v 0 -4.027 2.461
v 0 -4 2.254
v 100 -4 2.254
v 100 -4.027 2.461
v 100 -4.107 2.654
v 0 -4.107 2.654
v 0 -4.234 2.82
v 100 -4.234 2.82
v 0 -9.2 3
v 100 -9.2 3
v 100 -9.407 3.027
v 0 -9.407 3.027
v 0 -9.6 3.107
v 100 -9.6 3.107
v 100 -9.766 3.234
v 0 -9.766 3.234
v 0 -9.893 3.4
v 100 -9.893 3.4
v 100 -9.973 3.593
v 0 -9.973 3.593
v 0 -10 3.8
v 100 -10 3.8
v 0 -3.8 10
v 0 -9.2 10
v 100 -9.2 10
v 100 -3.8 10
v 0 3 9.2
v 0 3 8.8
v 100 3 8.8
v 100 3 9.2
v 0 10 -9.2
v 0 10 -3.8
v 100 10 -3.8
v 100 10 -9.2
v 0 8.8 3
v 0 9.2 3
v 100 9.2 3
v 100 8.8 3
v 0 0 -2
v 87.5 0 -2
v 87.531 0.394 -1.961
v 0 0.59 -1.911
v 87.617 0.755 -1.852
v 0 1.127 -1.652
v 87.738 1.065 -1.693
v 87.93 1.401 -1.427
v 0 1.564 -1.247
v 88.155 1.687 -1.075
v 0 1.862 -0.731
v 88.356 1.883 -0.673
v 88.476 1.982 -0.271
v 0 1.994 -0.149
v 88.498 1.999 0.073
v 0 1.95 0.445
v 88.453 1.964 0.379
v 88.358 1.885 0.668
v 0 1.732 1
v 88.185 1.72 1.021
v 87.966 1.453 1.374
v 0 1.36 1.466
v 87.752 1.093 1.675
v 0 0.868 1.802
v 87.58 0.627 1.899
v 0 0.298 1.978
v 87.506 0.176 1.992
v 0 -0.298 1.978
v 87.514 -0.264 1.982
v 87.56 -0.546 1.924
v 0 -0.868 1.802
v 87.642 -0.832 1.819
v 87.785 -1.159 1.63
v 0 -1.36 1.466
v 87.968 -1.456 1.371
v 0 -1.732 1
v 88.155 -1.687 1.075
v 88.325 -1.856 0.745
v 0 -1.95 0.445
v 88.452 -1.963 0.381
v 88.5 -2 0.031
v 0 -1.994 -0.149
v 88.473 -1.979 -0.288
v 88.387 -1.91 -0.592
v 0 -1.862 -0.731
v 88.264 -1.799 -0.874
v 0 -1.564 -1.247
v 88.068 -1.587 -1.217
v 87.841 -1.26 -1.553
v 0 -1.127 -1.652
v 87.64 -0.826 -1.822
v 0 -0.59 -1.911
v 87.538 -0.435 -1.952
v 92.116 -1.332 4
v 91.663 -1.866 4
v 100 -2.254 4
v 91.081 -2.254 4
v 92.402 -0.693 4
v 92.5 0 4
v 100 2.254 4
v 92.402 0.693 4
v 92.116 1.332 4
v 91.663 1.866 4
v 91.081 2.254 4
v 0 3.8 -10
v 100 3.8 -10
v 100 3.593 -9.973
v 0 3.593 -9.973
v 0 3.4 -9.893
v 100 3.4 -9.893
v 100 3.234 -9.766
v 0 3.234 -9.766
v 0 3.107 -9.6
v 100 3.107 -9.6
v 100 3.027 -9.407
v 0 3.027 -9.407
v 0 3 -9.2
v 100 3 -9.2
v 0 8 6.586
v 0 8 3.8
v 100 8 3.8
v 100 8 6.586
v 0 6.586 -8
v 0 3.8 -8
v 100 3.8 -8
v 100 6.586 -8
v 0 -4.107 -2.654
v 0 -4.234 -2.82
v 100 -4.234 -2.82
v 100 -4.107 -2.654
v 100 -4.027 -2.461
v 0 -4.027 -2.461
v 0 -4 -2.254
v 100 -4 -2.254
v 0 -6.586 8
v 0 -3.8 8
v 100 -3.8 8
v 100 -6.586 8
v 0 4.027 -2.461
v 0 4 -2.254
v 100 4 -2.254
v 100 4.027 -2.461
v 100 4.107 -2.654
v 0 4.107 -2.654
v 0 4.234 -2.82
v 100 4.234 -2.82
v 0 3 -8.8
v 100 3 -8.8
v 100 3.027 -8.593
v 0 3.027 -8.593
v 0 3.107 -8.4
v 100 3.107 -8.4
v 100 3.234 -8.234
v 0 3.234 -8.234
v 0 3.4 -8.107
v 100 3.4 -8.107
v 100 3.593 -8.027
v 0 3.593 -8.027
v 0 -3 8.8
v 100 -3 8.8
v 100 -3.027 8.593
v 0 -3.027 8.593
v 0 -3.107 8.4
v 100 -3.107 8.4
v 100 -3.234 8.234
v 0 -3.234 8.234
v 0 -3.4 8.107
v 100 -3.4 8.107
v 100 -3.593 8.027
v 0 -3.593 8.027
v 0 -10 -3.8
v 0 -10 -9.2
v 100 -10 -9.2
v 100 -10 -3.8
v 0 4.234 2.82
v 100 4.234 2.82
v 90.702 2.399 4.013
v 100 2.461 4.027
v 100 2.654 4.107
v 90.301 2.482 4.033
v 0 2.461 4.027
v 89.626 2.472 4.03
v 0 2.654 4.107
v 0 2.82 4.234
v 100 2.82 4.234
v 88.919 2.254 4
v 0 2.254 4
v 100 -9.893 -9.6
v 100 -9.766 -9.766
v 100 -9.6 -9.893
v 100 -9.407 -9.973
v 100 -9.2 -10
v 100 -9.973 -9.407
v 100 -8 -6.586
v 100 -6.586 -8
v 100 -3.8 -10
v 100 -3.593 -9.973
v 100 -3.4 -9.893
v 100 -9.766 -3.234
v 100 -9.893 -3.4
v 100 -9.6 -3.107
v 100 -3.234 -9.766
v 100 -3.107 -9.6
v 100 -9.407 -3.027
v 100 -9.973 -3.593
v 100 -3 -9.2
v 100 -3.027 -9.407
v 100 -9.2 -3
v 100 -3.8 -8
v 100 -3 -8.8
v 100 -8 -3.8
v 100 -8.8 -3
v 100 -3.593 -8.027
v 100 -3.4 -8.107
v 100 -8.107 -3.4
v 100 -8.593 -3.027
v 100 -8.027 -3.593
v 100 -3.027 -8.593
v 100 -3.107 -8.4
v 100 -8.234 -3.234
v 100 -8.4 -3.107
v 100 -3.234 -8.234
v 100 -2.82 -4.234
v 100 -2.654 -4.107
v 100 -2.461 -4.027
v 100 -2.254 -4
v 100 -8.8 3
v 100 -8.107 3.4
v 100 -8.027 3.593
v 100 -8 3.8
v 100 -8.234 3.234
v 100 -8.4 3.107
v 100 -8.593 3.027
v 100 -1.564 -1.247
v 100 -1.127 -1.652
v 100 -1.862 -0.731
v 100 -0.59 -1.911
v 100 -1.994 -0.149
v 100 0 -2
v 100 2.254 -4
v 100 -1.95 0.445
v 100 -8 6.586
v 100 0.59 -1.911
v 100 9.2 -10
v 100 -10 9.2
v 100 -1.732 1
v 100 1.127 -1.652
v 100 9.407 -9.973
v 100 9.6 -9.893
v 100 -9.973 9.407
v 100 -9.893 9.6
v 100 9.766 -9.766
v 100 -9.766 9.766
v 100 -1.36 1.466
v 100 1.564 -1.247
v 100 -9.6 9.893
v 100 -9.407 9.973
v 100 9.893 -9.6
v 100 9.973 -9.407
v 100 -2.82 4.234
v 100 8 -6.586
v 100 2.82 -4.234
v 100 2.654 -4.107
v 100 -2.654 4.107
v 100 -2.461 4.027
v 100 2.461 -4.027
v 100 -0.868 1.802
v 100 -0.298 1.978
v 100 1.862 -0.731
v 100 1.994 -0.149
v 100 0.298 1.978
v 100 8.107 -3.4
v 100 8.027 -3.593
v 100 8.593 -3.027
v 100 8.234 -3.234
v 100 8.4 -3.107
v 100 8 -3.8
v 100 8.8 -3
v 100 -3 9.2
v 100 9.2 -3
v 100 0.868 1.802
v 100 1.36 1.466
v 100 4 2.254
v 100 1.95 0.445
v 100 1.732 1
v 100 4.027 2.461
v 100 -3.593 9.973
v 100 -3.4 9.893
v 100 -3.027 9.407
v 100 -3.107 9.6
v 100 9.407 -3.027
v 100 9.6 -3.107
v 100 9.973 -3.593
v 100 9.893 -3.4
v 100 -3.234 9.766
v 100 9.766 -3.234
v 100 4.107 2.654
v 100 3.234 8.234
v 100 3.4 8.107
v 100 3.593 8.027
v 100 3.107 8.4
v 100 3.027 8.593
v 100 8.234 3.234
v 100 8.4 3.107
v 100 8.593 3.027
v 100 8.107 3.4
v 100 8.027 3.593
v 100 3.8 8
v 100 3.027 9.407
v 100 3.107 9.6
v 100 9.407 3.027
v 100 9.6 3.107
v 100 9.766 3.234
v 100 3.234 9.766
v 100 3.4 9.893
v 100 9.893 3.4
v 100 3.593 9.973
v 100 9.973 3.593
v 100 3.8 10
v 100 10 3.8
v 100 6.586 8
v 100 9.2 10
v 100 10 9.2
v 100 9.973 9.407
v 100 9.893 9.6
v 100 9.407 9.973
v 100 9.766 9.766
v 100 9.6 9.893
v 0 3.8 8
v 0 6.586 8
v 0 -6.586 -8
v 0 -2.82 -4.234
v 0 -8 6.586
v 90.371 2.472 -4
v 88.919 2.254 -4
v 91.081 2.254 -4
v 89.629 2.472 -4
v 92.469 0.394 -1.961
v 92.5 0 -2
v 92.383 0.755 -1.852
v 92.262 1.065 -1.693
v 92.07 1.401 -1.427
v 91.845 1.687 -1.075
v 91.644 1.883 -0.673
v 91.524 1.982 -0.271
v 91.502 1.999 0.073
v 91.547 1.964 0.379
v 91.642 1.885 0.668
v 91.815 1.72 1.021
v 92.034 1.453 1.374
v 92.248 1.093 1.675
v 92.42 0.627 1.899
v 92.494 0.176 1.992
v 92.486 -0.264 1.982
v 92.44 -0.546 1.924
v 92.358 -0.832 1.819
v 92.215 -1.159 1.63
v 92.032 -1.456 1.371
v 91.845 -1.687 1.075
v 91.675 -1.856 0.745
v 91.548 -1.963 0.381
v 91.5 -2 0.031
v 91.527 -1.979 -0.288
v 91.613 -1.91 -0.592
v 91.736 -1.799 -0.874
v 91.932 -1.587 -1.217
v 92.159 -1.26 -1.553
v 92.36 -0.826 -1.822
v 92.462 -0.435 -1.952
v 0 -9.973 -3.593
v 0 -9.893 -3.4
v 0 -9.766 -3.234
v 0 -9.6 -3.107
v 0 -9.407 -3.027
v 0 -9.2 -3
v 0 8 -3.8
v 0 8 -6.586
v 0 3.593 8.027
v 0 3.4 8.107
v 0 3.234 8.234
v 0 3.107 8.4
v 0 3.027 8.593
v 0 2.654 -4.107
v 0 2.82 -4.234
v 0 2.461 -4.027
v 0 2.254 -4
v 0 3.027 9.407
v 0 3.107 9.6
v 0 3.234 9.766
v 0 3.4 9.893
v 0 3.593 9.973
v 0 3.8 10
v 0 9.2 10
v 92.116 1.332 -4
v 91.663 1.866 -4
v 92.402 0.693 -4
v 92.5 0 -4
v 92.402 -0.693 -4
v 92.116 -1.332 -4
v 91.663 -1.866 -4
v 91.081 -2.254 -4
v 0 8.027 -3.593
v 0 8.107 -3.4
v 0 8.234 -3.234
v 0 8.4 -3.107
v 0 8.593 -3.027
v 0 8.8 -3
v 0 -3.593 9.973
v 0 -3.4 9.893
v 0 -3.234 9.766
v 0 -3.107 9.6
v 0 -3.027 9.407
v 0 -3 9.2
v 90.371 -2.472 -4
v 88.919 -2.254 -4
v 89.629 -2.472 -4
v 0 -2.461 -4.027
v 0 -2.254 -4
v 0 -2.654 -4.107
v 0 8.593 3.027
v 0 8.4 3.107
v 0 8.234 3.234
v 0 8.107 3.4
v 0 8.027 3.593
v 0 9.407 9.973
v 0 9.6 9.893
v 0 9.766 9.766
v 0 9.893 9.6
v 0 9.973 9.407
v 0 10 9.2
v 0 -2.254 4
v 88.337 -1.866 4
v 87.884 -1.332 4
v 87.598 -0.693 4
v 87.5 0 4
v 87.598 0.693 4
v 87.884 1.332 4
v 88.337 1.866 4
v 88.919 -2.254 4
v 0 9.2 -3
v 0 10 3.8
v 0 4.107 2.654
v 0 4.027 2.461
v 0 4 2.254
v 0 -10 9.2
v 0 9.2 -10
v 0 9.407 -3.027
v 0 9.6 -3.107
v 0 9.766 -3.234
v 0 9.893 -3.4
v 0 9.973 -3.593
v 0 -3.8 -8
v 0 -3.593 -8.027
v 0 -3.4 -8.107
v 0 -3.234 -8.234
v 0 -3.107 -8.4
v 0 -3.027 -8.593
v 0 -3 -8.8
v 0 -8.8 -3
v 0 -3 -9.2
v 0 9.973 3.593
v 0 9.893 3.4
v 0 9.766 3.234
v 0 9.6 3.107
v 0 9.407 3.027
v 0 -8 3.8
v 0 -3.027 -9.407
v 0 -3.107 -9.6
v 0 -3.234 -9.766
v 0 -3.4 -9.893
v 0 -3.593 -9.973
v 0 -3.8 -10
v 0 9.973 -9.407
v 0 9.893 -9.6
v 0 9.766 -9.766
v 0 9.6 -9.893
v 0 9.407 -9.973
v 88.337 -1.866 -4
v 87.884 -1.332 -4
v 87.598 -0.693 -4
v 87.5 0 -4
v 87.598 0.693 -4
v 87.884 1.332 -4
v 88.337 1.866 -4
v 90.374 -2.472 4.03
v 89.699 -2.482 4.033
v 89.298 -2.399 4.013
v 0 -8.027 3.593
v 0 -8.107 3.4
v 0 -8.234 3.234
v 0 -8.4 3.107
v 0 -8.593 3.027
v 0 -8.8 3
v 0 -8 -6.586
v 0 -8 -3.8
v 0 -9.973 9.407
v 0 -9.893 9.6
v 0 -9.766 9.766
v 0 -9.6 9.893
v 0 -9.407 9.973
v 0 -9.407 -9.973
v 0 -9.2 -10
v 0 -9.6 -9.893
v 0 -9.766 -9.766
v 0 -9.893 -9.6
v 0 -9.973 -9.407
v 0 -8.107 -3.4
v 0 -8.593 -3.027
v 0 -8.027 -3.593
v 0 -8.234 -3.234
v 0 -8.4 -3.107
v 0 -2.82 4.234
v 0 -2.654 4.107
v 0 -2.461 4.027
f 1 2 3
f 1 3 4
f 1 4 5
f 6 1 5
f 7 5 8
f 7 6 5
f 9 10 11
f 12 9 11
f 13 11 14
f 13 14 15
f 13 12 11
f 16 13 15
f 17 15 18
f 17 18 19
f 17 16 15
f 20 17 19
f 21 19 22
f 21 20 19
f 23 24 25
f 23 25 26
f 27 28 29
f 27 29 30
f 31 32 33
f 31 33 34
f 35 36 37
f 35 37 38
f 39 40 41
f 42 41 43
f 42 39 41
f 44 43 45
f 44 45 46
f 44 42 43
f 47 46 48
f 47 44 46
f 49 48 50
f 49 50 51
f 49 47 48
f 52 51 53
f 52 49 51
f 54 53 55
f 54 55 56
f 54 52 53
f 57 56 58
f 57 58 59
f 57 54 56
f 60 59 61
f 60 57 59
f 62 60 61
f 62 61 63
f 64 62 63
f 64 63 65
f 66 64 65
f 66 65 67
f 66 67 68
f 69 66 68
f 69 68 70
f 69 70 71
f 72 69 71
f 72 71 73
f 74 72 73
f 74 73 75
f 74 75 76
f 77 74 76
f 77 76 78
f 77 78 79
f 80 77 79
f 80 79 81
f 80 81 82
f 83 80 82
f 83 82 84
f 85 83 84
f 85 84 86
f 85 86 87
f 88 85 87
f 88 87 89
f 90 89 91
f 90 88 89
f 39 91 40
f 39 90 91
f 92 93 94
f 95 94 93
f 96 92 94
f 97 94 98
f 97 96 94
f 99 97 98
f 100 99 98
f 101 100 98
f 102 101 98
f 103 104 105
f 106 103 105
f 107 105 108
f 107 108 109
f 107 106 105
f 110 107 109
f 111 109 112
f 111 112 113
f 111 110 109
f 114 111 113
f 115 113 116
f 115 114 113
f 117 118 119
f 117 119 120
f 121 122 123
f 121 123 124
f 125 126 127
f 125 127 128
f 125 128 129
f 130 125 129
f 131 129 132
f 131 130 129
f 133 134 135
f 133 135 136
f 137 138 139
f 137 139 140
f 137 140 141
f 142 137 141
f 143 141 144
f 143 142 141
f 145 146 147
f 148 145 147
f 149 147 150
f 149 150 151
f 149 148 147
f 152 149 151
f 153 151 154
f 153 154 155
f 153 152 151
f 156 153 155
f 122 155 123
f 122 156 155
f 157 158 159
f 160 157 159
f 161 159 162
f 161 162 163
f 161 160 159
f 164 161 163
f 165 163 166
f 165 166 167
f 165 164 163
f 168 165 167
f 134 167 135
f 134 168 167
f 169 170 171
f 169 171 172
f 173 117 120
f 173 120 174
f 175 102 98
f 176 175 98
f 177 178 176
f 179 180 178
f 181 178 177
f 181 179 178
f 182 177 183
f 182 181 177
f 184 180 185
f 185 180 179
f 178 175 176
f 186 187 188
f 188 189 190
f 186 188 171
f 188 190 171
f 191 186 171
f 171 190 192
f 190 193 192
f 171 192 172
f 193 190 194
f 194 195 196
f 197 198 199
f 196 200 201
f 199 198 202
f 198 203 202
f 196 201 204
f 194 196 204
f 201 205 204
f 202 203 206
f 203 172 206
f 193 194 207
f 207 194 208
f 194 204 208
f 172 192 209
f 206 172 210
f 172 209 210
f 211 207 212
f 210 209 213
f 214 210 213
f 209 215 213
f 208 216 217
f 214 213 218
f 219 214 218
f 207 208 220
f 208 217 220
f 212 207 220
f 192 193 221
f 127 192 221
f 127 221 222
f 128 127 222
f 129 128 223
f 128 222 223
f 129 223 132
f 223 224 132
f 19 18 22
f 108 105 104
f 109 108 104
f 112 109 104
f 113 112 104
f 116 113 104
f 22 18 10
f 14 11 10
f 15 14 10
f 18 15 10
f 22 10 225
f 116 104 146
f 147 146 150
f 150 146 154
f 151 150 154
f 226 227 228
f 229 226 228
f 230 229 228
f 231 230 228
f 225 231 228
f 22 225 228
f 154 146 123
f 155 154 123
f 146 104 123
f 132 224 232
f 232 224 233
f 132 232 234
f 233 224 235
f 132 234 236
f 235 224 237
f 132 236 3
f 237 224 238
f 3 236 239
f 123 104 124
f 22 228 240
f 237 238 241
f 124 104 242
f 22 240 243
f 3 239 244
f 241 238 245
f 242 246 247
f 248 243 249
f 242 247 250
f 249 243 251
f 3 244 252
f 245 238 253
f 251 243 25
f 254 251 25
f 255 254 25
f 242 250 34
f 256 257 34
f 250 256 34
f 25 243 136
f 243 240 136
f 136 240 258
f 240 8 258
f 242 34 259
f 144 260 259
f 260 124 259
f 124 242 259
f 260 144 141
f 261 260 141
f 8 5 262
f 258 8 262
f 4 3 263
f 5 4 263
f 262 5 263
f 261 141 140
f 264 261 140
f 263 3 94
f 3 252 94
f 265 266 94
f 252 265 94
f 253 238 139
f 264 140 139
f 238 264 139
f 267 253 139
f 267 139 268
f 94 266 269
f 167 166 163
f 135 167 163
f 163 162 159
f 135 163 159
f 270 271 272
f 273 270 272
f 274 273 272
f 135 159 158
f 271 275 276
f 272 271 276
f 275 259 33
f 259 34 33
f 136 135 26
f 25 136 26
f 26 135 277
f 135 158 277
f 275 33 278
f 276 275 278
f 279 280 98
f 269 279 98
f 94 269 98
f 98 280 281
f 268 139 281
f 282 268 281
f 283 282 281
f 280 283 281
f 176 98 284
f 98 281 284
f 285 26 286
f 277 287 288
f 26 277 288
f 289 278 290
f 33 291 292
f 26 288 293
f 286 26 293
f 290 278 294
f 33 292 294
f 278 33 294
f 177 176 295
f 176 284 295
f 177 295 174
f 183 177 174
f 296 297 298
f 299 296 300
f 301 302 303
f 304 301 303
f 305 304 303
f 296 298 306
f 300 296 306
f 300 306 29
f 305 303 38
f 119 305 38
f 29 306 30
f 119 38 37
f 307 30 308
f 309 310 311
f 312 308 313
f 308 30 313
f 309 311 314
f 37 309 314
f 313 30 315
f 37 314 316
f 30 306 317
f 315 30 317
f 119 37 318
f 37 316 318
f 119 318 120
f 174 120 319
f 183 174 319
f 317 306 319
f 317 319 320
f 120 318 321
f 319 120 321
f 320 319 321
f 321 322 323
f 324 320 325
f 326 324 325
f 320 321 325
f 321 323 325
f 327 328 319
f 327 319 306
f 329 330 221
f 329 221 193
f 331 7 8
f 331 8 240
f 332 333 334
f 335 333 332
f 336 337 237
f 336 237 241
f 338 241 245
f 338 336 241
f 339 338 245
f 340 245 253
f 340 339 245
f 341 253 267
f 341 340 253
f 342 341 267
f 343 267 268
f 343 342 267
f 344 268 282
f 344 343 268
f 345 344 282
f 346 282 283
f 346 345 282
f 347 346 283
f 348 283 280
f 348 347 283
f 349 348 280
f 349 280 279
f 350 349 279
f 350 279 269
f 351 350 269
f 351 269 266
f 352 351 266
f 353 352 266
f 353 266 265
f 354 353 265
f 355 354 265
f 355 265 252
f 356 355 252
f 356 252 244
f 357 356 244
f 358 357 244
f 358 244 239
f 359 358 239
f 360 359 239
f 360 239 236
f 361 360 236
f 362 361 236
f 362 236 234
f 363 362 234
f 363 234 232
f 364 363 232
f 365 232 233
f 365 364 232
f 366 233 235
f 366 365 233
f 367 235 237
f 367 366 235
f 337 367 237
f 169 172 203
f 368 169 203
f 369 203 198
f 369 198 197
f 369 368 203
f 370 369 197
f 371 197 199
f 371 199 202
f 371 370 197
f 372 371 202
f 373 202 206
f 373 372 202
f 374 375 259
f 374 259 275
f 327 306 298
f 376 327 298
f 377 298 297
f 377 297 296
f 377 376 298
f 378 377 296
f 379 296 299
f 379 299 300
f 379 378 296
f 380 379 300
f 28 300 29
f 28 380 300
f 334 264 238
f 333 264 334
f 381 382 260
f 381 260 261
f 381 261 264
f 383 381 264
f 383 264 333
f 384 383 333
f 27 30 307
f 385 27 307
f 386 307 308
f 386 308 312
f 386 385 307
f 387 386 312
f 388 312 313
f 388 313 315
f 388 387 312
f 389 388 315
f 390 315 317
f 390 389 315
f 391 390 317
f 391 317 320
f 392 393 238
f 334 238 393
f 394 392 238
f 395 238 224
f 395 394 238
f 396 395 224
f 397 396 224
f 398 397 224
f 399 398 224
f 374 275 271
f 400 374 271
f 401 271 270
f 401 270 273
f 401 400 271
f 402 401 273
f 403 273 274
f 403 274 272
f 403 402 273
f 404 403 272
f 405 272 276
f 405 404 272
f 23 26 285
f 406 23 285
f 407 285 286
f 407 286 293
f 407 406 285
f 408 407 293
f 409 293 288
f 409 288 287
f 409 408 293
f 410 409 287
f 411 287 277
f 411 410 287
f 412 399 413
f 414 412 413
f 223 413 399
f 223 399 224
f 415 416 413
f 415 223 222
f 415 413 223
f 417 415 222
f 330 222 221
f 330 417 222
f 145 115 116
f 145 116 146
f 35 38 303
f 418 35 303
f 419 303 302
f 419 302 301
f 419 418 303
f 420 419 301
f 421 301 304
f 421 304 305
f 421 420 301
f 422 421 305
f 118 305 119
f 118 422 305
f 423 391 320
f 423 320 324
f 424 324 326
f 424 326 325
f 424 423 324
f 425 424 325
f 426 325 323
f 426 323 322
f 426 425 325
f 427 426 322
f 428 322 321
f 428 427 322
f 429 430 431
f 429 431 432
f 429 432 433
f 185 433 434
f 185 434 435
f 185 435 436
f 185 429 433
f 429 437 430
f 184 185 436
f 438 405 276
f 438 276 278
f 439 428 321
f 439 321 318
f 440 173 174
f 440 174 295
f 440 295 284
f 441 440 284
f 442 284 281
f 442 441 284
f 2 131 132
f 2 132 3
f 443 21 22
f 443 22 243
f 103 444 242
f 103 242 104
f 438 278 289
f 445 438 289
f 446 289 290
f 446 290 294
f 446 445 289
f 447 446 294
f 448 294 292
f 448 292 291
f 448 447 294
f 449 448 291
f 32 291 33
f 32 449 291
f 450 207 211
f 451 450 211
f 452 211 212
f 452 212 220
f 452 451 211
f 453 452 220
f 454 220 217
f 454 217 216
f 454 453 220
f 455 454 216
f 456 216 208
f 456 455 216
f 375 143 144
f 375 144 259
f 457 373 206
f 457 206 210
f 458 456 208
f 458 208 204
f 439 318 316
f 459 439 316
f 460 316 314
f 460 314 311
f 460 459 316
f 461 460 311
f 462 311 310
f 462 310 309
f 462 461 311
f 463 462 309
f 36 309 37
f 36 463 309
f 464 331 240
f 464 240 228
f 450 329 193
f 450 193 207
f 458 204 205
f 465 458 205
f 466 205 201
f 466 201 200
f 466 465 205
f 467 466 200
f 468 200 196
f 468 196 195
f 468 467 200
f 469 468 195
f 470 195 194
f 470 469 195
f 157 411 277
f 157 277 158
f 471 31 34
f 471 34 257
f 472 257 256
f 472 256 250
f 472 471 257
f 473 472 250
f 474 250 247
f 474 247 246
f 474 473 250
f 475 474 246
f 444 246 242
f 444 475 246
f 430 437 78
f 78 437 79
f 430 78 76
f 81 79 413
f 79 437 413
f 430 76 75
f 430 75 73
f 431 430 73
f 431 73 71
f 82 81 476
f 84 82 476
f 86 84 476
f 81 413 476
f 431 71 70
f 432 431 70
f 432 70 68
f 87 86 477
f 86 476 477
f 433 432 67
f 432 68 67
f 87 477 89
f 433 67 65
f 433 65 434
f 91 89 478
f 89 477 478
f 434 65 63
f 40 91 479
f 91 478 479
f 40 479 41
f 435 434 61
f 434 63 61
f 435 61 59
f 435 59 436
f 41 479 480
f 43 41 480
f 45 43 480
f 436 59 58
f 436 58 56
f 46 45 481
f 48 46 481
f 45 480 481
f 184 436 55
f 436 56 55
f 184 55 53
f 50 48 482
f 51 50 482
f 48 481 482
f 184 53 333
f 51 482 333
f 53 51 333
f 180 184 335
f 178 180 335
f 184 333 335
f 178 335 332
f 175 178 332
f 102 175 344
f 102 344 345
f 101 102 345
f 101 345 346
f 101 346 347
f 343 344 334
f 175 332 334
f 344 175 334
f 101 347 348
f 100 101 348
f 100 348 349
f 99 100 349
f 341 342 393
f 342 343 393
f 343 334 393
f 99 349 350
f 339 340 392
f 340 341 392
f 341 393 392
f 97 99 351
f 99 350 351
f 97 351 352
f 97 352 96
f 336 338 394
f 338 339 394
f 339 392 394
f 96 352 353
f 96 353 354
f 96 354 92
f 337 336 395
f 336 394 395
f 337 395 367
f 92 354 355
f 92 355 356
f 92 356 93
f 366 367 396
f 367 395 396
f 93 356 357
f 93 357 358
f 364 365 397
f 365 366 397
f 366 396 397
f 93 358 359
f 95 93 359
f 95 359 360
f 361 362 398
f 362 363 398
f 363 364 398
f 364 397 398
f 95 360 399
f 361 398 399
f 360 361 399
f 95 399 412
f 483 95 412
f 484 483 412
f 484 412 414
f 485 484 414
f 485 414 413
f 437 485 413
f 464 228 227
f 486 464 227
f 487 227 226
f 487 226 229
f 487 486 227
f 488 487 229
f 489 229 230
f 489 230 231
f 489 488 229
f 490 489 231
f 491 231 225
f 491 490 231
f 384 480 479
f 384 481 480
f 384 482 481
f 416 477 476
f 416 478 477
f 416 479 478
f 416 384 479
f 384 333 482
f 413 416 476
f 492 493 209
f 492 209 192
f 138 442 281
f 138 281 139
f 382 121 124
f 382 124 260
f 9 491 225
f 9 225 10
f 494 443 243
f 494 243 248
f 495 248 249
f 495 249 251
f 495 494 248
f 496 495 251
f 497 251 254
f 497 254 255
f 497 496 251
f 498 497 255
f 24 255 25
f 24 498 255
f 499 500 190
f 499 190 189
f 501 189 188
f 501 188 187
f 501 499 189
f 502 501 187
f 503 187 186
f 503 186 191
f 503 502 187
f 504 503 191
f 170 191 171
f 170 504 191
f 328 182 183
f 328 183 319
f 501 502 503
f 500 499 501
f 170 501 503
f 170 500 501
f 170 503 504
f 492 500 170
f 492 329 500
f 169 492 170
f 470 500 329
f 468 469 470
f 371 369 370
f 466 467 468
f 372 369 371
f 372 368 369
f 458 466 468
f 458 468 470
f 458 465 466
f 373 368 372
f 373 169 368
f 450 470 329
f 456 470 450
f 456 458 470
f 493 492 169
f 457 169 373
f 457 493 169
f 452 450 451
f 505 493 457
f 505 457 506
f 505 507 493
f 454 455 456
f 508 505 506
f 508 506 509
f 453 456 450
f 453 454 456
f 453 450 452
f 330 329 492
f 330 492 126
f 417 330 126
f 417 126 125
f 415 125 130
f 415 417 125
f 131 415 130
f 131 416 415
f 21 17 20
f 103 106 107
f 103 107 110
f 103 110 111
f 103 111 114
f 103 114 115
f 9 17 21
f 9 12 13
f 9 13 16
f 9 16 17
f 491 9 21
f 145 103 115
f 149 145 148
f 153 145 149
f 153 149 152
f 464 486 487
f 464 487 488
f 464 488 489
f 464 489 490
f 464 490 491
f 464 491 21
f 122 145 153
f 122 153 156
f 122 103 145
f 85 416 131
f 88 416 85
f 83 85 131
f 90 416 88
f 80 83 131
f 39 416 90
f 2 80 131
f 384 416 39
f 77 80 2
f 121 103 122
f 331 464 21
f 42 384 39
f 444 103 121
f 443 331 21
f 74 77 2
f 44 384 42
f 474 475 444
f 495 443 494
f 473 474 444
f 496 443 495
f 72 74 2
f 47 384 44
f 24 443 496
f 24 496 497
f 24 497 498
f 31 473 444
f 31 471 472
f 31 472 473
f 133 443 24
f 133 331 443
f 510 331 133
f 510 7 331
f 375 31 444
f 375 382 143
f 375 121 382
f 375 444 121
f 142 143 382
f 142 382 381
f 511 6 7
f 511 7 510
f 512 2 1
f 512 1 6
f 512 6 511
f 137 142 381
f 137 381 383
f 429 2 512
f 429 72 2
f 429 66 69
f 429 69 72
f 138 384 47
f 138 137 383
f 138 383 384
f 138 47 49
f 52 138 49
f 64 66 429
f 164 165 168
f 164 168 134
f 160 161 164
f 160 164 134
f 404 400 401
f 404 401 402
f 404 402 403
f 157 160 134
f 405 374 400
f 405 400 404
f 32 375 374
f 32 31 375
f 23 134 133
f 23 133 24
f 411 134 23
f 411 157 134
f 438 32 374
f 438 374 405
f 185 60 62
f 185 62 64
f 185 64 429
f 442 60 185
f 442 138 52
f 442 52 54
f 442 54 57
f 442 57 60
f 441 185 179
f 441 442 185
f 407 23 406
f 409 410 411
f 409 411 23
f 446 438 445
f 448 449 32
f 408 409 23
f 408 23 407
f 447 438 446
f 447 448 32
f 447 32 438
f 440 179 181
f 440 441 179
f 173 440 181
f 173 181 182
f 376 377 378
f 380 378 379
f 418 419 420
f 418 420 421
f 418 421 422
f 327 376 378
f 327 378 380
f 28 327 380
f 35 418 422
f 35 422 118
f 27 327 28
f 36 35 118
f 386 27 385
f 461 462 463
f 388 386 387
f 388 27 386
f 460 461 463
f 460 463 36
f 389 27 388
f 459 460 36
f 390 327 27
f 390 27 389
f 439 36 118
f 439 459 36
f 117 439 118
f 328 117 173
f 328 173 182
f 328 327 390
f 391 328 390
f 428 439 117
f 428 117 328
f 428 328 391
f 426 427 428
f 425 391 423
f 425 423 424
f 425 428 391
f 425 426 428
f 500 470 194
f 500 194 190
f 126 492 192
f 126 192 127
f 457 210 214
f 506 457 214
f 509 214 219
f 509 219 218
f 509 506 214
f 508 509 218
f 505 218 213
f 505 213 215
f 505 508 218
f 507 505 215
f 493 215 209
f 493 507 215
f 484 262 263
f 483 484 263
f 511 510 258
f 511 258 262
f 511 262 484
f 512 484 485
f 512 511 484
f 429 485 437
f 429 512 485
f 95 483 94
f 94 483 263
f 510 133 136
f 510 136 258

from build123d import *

# Parameters (mm, degrees)
SKETCH11_R         = 2
SIZE_4X4_1_DEPTH   = 100
SKETCH12_R         = 2.5
CUT_EXTRUDE1_DEPTH = 10


with BuildPart() as part:
    # Sketch11 → Size 4X4 (1) (new body)
    with BuildSketch(Plane(origin=(0, 0, 0), x_dir=(0, 0, -1), z_dir=(1, 0, 0))):
        with BuildLine():
            Line((-3, 9.2), (-3, 8.8))
            ThreePointArc((-3, 8.8), (-3.234314575, 8.234314575), (-3.8, 8))
            Line((-3.8, 8), (-6.585786438, 8))
            Line((-6.585786438, 8), (-2.820101013, 4.234314575))
            ThreePointArc((-2.820101013, 4.234314575), (-2.560562334, 4.060896374), (-2.254415588, 4))
            Line((-2.254415588, 4), (2.254415588, 4))
            ThreePointArc((2.254415588, 4), (2.560562334, 4.060896374), (2.820101013, 4.234314575))
            Line((2.820101013, 4.234314575), (6.585786438, 8))
            Line((6.585786438, 8), (3.8, 8))
            ThreePointArc((3.8, 8), (3.234314575, 8.234314575), (3, 8.8))
            Line((3, 8.8), (3, 9.2))
            ThreePointArc((3, 9.2), (3.234314575, 9.765685425), (3.8, 10))
            Line((3.8, 10), (9.2, 10))
            ThreePointArc((9.2, 10), (9.765685425, 9.765685425), (10, 9.2))
            Line((10, 9.2), (10, 3.8))
            ThreePointArc((10, 3.8), (9.765685425, 3.234314575), (9.2, 3))
            Line((9.2, 3), (8.8, 3))
            ThreePointArc((8.8, 3), (8.234314575, 3.234314575), (8, 3.8))
            Line((8, 3.8), (8, 6.585786438))
            Line((8, 6.585786438), (4.234314575, 2.820101013))
            ThreePointArc((4.234314575, 2.820101013), (4.060896374, 2.560562334), (4, 2.254415588))
            Line((4, 2.254415588), (4, -2.254415588))
            ThreePointArc((4, -2.254415588), (4.060896374, -2.560562334), (4.234314575, -2.820101013))
            Line((4.234314575, -2.820101013), (8, -6.585786438))
            Line((8, -6.585786438), (8, -3.8))
            ThreePointArc((8, -3.8), (8.234314575, -3.234314575), (8.8, -3))
            Line((8.8, -3), (9.2, -3))
            ThreePointArc((9.2, -3), (9.765685425, -3.234314575), (10, -3.8))
            Line((10, -3.8), (10, -9.2))
            ThreePointArc((10, -9.2), (9.765685425, -9.765685425), (9.2, -10))
            Line((9.2, -10), (3.8, -10))
            ThreePointArc((3.8, -10), (3.234314575, -9.765685425), (3, -9.2))
            Line((3, -9.2), (3, -8.8))
            ThreePointArc((3, -8.8), (3.234314575, -8.234314575), (3.8, -8))
            Line((3.8, -8), (6.585786438, -8))
            Line((6.585786438, -8), (2.820101013, -4.234314575))
            ThreePointArc((2.820101013, -4.234314575), (2.560562334, -4.060896374), (2.254415588, -4))
            Line((2.254415588, -4), (-2.254415588, -4))
            ThreePointArc((-2.254415588, -4), (-2.560562334, -4.060896374), (-2.820101013, -4.234314575))
            Line((-2.820101013, -4.234314575), (-6.585786438, -8))
            Line((-6.585786438, -8), (-3.8, -8))
            ThreePointArc((-3.8, -8), (-3.234314575, -8.234314575), (-3, -8.8))
            Line((-3, -8.8), (-3, -9.2))
            ThreePointArc((-3, -9.2), (-3.234314575, -9.765685425), (-3.8, -10))
            Line((-3.8, -10), (-9.2, -10))
            ThreePointArc((-9.2, -10), (-9.765685425, -9.765685425), (-10, -9.2))
            Line((-10, -9.2), (-10, -3.8))
            ThreePointArc((-10, -3.8), (-9.765685425, -3.234314575), (-9.2, -3))
            Line((-9.2, -3), (-8.8, -3))
            ThreePointArc((-8.8, -3), (-8.234314575, -3.234314575), (-8, -3.8))
            Line((-8, -3.8), (-8, -6.585786438))
            Line((-8, -6.585786438), (-4.234314575, -2.820101013))
            ThreePointArc((-4.234314575, -2.820101013), (-4.060896374, -2.560562334), (-4, -2.254415588))
            Line((-4, -2.254415588), (-4, 2.254415588))
            ThreePointArc((-4, 2.254415588), (-4.060896374, 2.560562334), (-4.234314575, 2.820101013))
            Line((-4.234314575, 2.820101013), (-8, 6.585786438))
            Line((-8, 6.585786438), (-8, 3.8))
            ThreePointArc((-8, 3.8), (-8.234314575, 3.234314575), (-8.8, 3))
            Line((-8.8, 3), (-9.2, 3))
            ThreePointArc((-9.2, 3), (-9.765685425, 3.234314575), (-10, 3.8))
            Line((-10, 3.8), (-10, 9.2))
            ThreePointArc((-10, 9.2), (-9.765685425, 9.765685425), (-9.2, 10))
            Line((-9.2, 10), (-3.8, 10))
            ThreePointArc((-3.8, 10), (-3.234314575, 9.765685425), (-3, 9.2))
        make_face()
        Circle(SKETCH11_R, mode=Mode.SUBTRACT)
    extrude(amount=SIZE_4X4_1_DEPTH)

    # Sketch12 → Cut-Extrude1 (cut)
    with BuildSketch(Plane(origin=(0, 0, -4), x_dir=(-1, 0, 0), z_dir=(0, 0, -1))):
        with Locations(Location((-90, 0, 0), (0, 0, 295.608789007))):
            Circle(SKETCH12_R)
    extrude(amount=-CUT_EXTRUDE1_DEPTH, mode=Mode.SUBTRACT)


solid = part.part
